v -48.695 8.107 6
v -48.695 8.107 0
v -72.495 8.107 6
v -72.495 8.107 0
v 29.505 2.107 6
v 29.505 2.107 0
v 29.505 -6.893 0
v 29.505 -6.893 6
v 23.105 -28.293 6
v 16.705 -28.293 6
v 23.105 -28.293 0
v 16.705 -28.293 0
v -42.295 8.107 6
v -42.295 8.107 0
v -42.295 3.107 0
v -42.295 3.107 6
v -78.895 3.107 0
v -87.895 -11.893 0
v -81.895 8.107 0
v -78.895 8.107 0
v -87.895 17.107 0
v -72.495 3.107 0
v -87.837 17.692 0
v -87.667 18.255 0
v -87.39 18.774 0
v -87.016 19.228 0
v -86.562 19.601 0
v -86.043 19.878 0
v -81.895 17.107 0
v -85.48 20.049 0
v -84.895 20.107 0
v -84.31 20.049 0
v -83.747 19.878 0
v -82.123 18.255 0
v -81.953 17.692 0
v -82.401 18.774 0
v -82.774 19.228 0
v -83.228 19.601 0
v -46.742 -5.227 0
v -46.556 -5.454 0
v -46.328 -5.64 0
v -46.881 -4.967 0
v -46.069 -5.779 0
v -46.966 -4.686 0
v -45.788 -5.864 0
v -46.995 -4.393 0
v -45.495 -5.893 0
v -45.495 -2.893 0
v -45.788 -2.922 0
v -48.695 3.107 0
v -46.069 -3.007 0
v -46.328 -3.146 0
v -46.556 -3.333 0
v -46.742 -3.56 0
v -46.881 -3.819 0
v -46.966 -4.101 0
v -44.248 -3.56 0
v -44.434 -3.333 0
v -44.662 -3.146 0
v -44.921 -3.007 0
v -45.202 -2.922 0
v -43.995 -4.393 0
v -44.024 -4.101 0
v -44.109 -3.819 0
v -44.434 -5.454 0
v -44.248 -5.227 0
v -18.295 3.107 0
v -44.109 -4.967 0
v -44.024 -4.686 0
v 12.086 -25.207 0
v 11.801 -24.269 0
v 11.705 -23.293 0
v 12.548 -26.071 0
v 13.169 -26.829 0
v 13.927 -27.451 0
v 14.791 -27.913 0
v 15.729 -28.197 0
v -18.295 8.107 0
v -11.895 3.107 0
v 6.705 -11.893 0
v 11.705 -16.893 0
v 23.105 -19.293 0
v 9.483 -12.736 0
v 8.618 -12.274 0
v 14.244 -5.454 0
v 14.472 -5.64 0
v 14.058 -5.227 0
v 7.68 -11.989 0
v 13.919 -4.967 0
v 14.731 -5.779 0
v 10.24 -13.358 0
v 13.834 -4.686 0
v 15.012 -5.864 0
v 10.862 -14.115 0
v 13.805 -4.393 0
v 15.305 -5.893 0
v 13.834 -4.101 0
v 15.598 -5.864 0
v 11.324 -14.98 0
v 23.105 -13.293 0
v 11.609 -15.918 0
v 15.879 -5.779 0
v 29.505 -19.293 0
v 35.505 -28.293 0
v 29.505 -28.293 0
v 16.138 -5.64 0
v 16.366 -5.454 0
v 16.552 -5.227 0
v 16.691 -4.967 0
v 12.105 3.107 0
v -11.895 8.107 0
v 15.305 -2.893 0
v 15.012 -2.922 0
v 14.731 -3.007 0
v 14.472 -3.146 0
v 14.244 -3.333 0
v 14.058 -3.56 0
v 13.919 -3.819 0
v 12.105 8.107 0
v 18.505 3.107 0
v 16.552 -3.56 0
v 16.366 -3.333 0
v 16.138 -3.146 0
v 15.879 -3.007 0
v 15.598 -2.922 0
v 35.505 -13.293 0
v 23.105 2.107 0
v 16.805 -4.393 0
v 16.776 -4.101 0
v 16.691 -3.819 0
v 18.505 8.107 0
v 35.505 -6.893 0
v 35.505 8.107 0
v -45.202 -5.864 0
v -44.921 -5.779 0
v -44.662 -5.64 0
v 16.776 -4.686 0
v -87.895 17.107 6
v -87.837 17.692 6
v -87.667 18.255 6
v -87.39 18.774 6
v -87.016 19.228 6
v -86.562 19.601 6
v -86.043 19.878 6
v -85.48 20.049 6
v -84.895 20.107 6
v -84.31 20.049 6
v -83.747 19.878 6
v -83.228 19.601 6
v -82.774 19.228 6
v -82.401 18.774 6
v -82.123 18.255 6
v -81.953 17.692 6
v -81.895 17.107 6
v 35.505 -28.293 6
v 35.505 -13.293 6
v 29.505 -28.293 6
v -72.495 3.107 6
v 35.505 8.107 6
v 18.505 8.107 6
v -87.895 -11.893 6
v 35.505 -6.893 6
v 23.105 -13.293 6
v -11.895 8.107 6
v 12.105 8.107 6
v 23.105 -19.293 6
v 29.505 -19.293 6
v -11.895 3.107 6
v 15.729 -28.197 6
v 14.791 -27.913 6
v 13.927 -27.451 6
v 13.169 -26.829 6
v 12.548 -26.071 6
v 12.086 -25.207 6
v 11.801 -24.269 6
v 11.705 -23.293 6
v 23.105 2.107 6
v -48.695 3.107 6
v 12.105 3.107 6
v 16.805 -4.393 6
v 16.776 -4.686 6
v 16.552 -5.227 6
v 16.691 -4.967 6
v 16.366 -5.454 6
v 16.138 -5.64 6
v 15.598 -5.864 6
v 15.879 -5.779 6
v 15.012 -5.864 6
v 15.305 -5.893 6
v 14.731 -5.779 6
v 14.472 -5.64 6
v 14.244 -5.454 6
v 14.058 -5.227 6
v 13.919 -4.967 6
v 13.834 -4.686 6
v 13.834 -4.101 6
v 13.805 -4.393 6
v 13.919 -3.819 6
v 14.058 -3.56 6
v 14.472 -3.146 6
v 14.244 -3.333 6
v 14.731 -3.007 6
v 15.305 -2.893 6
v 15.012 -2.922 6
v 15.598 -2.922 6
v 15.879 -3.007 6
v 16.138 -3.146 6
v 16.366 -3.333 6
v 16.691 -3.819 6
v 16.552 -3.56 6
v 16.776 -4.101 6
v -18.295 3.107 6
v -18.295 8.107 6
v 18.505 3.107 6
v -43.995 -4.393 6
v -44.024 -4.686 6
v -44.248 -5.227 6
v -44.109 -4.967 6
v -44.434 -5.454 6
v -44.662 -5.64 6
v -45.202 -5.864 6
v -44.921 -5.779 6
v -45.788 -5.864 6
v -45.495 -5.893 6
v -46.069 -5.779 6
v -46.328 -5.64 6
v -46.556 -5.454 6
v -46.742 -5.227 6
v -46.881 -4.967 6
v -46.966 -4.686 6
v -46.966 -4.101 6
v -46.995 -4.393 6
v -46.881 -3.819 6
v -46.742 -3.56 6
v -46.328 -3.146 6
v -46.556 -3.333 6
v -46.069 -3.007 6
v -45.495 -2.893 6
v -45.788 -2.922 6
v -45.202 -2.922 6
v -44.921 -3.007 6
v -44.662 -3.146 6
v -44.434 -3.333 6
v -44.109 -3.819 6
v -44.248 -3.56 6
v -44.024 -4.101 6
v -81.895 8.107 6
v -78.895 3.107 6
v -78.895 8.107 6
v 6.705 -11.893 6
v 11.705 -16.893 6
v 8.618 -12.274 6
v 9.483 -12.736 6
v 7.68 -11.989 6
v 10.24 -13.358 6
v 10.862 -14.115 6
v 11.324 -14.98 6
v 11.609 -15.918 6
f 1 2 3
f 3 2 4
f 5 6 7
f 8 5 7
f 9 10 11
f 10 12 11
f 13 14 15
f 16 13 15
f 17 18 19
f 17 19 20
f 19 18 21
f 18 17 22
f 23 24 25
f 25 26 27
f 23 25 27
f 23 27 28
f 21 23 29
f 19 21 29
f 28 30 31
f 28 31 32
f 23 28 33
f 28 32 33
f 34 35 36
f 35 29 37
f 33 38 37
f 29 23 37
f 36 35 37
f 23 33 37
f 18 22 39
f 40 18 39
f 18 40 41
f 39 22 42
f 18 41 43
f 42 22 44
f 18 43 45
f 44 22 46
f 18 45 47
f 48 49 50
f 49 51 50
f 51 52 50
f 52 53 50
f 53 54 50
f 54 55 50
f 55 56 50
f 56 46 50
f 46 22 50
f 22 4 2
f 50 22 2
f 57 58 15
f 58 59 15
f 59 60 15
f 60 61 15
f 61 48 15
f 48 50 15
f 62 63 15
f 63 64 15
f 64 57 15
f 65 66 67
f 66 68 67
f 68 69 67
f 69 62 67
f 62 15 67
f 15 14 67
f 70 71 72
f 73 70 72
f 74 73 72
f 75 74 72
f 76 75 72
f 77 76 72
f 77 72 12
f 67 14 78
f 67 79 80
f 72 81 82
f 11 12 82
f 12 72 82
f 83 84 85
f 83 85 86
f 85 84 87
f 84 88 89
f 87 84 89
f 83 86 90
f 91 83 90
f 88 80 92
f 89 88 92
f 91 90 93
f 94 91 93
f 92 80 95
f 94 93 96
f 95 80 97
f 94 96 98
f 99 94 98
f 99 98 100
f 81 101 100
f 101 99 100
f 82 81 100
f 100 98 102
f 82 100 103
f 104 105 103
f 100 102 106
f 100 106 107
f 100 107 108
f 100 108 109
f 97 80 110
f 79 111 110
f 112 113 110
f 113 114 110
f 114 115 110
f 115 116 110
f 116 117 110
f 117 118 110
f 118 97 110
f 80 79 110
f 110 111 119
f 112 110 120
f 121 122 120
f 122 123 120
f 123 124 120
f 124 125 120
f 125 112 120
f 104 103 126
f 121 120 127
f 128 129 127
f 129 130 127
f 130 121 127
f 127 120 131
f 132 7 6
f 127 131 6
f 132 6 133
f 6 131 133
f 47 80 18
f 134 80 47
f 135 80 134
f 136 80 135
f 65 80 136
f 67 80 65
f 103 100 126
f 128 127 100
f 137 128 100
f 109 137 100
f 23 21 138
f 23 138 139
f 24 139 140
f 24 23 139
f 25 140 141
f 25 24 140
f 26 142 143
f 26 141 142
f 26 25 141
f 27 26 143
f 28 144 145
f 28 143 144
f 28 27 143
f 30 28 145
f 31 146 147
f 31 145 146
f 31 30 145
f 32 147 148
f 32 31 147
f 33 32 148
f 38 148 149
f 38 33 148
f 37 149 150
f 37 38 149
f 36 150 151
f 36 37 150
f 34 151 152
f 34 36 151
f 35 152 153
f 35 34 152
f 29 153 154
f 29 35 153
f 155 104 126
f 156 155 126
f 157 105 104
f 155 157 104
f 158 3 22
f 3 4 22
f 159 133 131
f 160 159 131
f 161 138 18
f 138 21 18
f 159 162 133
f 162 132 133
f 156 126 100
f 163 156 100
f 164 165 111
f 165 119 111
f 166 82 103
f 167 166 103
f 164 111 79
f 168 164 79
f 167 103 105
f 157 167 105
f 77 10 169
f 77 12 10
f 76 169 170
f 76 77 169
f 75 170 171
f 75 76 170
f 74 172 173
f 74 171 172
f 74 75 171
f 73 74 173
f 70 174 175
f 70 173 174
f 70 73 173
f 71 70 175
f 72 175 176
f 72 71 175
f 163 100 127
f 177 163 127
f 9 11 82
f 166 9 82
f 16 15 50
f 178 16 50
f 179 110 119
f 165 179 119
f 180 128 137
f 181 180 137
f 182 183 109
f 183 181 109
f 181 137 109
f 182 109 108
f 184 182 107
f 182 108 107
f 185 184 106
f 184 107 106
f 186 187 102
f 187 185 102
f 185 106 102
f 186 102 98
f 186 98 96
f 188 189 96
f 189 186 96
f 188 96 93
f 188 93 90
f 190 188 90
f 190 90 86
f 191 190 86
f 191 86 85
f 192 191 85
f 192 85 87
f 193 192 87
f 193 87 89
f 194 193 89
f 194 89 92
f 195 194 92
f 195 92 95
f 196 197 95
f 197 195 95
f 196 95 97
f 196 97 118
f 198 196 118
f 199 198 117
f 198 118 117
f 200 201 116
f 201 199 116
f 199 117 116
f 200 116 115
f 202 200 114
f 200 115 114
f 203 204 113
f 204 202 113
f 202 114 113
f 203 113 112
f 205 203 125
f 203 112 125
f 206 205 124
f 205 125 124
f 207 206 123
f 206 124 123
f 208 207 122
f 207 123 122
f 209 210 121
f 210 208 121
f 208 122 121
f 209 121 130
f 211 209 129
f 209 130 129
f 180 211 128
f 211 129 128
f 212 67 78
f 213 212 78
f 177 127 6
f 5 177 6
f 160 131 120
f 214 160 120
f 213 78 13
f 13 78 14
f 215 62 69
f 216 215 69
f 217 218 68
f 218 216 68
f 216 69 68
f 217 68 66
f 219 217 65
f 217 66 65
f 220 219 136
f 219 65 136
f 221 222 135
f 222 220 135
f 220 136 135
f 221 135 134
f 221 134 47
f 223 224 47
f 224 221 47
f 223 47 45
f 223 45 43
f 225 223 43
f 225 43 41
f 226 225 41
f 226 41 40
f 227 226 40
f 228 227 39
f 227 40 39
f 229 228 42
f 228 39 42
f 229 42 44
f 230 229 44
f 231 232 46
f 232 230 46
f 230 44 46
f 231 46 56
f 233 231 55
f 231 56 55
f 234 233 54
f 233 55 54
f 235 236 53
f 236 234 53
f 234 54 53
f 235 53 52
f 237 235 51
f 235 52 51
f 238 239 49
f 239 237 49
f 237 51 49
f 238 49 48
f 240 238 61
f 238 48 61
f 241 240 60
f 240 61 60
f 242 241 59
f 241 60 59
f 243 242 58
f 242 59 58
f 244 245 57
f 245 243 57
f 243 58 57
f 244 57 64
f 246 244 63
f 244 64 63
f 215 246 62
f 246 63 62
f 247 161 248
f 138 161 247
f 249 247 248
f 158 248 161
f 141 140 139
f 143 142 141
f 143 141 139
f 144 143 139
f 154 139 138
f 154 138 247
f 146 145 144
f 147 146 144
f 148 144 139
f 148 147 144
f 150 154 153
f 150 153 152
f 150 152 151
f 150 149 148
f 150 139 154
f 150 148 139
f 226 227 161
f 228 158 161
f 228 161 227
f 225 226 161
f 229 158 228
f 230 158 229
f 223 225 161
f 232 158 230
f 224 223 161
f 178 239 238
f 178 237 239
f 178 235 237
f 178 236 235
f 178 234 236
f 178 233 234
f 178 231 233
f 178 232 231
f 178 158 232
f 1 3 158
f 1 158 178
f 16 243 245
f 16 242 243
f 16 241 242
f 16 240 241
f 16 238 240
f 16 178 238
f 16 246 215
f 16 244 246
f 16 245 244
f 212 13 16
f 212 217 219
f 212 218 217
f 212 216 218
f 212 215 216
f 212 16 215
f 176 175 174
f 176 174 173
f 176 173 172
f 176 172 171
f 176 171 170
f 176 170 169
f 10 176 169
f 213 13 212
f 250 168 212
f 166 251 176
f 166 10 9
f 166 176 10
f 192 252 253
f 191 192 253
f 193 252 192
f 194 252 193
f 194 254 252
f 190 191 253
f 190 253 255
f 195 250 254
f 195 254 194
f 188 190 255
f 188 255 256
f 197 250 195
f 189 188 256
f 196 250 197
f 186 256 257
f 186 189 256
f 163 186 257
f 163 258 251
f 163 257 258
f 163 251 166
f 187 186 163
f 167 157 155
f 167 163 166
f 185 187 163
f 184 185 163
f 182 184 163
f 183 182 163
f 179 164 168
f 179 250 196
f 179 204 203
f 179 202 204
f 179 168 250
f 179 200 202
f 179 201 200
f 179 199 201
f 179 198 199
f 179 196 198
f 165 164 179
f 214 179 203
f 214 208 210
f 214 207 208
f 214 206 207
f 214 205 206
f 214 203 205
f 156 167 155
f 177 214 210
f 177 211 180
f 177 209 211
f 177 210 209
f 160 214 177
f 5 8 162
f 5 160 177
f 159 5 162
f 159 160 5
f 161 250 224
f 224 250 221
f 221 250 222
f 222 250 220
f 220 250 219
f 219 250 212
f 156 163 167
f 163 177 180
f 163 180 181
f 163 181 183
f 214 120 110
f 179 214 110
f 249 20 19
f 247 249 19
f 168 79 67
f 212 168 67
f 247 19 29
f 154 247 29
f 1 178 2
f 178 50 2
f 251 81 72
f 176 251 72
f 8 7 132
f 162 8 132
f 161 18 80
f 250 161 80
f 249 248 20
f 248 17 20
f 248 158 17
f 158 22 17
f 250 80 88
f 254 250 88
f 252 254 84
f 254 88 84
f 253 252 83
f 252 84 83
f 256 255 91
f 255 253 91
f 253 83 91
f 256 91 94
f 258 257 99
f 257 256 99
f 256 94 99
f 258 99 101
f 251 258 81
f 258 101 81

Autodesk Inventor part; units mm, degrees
ref_plane "YZ Plane" through (0, 0, 0) normal (1, 0, 0) x (0, 1, 0)
ref_plane "XZ Plane" through (0, 0, 0) normal (0, 1, 0) x (-1, 0, 0)
ref_plane "XY Plane" through (0, 0, 0) normal (0, 0, 1) x (1, 0, 0)
sketch "Sketch1" plane through (0, 0, 0) normal (0, 0, 1) x (1, 0, 0)
  arc A0 (11.7049, -23.2932) -> (16.7049, -28.2932) centre (16.7049, -23.2932) ccw
  line L0 (16.7049, -28.2932) -> (23.1049, -28.2932)
  line L1 (23.1049, -28.2932) -> (23.1049, -19.2932)
  line L2 (23.1049, -19.2932) -> (29.5049, -19.2932)
  line L3 (29.5049, -19.2932) -> (29.5049, -28.2932)
  line L4 (29.5049, -28.2932) -> (35.5049, -28.2932)
  line L5 (35.5049, -28.2932) -> (35.5049, -13.2932)
  line L6 (35.5049, -13.2932) -> (23.1049, -13.2932)
  line L7 (23.1049, -13.2932) -> (23.1049, 2.1068)
  line L8 (23.1049, 2.1068) -> (29.5049, 2.1068)
  line L9 (29.5049, 2.1068) -> (29.5049, -6.8932)
  line L10 (29.5049, -6.8932) -> (35.5049, -6.8932)
  line L11 (35.5049, -6.8932) -> (35.5049, 8.1068)
  line L12 (35.5049, 8.1068) -> (18.5049, 8.1068)
  line L13 (18.5049, 8.1068) -> (18.5049, 3.1068)
  line L14 (18.5049, 3.1068) -> (12.1049, 3.1068)
  line L15 (12.1049, 3.1068) -> (12.1049, 8.1068)
  line L16 (12.1049, 8.1068) -> (-11.8951, 8.1068)
  line L17 (-11.8951, 8.1068) -> (-11.8951, 3.1068)
  line L18 (-11.8951, 3.1068) -> (-18.2951, 3.1068)
  line L19 (-18.2951, 3.1068) -> (-18.2951, 8.1068)
  line L20 (-18.2951, 8.1068) -> (-42.2951, 8.1068)
  line L21 (-42.2951, 8.1068) -> (-42.2951, 3.1068)
  line L22 (-42.2951, 3.1068) -> (-48.6951, 3.1068)
  line L23 (-48.6951, 3.1068) -> (-48.6951, 8.1068)
  line L24 (-48.6951, 8.1068) -> (-72.4951, 8.1068)
  line L25 (-72.4951, 8.1068) -> (-72.4951, 3.1068)
  line L26 (-72.4951, 3.1068) -> (-78.8951, 3.1068)
  line L27 (-78.8951, 3.1068) -> (-78.8951, 8.1068)
  line L28 (-78.8951, 8.1068) -> (-81.8951, 8.1068)
  line L29 (-81.8951, 8.1068) -> (-81.8951, 17.1068)
  arc A1 (-81.8951, 17.1068) -> (-87.8951, 17.1068) centre (-84.8951, 17.1068) ccw
  line L30 (-87.8951, 17.1068) -> (-87.8951, -11.8932)
  line L31 (-87.8951, -11.8932) -> (6.7049, -11.8932)
  arc A2 (11.7049, -16.8932) -> (6.7049, -11.8932) centre (6.7049, -16.8932) ccw
  line L32 (11.7049, -16.8932) -> (11.7049, -23.2932)
  circle A3 centre (-45.4951, -4.3932) radius 1.5
  circle A4 centre (15.3049, -4.3932) radius 1.5
  point P0 (0, 0)
extrude "Extrusion1" add sketch "Sketch1" along normal blind 6
properties part number "spoolHolder_a"
